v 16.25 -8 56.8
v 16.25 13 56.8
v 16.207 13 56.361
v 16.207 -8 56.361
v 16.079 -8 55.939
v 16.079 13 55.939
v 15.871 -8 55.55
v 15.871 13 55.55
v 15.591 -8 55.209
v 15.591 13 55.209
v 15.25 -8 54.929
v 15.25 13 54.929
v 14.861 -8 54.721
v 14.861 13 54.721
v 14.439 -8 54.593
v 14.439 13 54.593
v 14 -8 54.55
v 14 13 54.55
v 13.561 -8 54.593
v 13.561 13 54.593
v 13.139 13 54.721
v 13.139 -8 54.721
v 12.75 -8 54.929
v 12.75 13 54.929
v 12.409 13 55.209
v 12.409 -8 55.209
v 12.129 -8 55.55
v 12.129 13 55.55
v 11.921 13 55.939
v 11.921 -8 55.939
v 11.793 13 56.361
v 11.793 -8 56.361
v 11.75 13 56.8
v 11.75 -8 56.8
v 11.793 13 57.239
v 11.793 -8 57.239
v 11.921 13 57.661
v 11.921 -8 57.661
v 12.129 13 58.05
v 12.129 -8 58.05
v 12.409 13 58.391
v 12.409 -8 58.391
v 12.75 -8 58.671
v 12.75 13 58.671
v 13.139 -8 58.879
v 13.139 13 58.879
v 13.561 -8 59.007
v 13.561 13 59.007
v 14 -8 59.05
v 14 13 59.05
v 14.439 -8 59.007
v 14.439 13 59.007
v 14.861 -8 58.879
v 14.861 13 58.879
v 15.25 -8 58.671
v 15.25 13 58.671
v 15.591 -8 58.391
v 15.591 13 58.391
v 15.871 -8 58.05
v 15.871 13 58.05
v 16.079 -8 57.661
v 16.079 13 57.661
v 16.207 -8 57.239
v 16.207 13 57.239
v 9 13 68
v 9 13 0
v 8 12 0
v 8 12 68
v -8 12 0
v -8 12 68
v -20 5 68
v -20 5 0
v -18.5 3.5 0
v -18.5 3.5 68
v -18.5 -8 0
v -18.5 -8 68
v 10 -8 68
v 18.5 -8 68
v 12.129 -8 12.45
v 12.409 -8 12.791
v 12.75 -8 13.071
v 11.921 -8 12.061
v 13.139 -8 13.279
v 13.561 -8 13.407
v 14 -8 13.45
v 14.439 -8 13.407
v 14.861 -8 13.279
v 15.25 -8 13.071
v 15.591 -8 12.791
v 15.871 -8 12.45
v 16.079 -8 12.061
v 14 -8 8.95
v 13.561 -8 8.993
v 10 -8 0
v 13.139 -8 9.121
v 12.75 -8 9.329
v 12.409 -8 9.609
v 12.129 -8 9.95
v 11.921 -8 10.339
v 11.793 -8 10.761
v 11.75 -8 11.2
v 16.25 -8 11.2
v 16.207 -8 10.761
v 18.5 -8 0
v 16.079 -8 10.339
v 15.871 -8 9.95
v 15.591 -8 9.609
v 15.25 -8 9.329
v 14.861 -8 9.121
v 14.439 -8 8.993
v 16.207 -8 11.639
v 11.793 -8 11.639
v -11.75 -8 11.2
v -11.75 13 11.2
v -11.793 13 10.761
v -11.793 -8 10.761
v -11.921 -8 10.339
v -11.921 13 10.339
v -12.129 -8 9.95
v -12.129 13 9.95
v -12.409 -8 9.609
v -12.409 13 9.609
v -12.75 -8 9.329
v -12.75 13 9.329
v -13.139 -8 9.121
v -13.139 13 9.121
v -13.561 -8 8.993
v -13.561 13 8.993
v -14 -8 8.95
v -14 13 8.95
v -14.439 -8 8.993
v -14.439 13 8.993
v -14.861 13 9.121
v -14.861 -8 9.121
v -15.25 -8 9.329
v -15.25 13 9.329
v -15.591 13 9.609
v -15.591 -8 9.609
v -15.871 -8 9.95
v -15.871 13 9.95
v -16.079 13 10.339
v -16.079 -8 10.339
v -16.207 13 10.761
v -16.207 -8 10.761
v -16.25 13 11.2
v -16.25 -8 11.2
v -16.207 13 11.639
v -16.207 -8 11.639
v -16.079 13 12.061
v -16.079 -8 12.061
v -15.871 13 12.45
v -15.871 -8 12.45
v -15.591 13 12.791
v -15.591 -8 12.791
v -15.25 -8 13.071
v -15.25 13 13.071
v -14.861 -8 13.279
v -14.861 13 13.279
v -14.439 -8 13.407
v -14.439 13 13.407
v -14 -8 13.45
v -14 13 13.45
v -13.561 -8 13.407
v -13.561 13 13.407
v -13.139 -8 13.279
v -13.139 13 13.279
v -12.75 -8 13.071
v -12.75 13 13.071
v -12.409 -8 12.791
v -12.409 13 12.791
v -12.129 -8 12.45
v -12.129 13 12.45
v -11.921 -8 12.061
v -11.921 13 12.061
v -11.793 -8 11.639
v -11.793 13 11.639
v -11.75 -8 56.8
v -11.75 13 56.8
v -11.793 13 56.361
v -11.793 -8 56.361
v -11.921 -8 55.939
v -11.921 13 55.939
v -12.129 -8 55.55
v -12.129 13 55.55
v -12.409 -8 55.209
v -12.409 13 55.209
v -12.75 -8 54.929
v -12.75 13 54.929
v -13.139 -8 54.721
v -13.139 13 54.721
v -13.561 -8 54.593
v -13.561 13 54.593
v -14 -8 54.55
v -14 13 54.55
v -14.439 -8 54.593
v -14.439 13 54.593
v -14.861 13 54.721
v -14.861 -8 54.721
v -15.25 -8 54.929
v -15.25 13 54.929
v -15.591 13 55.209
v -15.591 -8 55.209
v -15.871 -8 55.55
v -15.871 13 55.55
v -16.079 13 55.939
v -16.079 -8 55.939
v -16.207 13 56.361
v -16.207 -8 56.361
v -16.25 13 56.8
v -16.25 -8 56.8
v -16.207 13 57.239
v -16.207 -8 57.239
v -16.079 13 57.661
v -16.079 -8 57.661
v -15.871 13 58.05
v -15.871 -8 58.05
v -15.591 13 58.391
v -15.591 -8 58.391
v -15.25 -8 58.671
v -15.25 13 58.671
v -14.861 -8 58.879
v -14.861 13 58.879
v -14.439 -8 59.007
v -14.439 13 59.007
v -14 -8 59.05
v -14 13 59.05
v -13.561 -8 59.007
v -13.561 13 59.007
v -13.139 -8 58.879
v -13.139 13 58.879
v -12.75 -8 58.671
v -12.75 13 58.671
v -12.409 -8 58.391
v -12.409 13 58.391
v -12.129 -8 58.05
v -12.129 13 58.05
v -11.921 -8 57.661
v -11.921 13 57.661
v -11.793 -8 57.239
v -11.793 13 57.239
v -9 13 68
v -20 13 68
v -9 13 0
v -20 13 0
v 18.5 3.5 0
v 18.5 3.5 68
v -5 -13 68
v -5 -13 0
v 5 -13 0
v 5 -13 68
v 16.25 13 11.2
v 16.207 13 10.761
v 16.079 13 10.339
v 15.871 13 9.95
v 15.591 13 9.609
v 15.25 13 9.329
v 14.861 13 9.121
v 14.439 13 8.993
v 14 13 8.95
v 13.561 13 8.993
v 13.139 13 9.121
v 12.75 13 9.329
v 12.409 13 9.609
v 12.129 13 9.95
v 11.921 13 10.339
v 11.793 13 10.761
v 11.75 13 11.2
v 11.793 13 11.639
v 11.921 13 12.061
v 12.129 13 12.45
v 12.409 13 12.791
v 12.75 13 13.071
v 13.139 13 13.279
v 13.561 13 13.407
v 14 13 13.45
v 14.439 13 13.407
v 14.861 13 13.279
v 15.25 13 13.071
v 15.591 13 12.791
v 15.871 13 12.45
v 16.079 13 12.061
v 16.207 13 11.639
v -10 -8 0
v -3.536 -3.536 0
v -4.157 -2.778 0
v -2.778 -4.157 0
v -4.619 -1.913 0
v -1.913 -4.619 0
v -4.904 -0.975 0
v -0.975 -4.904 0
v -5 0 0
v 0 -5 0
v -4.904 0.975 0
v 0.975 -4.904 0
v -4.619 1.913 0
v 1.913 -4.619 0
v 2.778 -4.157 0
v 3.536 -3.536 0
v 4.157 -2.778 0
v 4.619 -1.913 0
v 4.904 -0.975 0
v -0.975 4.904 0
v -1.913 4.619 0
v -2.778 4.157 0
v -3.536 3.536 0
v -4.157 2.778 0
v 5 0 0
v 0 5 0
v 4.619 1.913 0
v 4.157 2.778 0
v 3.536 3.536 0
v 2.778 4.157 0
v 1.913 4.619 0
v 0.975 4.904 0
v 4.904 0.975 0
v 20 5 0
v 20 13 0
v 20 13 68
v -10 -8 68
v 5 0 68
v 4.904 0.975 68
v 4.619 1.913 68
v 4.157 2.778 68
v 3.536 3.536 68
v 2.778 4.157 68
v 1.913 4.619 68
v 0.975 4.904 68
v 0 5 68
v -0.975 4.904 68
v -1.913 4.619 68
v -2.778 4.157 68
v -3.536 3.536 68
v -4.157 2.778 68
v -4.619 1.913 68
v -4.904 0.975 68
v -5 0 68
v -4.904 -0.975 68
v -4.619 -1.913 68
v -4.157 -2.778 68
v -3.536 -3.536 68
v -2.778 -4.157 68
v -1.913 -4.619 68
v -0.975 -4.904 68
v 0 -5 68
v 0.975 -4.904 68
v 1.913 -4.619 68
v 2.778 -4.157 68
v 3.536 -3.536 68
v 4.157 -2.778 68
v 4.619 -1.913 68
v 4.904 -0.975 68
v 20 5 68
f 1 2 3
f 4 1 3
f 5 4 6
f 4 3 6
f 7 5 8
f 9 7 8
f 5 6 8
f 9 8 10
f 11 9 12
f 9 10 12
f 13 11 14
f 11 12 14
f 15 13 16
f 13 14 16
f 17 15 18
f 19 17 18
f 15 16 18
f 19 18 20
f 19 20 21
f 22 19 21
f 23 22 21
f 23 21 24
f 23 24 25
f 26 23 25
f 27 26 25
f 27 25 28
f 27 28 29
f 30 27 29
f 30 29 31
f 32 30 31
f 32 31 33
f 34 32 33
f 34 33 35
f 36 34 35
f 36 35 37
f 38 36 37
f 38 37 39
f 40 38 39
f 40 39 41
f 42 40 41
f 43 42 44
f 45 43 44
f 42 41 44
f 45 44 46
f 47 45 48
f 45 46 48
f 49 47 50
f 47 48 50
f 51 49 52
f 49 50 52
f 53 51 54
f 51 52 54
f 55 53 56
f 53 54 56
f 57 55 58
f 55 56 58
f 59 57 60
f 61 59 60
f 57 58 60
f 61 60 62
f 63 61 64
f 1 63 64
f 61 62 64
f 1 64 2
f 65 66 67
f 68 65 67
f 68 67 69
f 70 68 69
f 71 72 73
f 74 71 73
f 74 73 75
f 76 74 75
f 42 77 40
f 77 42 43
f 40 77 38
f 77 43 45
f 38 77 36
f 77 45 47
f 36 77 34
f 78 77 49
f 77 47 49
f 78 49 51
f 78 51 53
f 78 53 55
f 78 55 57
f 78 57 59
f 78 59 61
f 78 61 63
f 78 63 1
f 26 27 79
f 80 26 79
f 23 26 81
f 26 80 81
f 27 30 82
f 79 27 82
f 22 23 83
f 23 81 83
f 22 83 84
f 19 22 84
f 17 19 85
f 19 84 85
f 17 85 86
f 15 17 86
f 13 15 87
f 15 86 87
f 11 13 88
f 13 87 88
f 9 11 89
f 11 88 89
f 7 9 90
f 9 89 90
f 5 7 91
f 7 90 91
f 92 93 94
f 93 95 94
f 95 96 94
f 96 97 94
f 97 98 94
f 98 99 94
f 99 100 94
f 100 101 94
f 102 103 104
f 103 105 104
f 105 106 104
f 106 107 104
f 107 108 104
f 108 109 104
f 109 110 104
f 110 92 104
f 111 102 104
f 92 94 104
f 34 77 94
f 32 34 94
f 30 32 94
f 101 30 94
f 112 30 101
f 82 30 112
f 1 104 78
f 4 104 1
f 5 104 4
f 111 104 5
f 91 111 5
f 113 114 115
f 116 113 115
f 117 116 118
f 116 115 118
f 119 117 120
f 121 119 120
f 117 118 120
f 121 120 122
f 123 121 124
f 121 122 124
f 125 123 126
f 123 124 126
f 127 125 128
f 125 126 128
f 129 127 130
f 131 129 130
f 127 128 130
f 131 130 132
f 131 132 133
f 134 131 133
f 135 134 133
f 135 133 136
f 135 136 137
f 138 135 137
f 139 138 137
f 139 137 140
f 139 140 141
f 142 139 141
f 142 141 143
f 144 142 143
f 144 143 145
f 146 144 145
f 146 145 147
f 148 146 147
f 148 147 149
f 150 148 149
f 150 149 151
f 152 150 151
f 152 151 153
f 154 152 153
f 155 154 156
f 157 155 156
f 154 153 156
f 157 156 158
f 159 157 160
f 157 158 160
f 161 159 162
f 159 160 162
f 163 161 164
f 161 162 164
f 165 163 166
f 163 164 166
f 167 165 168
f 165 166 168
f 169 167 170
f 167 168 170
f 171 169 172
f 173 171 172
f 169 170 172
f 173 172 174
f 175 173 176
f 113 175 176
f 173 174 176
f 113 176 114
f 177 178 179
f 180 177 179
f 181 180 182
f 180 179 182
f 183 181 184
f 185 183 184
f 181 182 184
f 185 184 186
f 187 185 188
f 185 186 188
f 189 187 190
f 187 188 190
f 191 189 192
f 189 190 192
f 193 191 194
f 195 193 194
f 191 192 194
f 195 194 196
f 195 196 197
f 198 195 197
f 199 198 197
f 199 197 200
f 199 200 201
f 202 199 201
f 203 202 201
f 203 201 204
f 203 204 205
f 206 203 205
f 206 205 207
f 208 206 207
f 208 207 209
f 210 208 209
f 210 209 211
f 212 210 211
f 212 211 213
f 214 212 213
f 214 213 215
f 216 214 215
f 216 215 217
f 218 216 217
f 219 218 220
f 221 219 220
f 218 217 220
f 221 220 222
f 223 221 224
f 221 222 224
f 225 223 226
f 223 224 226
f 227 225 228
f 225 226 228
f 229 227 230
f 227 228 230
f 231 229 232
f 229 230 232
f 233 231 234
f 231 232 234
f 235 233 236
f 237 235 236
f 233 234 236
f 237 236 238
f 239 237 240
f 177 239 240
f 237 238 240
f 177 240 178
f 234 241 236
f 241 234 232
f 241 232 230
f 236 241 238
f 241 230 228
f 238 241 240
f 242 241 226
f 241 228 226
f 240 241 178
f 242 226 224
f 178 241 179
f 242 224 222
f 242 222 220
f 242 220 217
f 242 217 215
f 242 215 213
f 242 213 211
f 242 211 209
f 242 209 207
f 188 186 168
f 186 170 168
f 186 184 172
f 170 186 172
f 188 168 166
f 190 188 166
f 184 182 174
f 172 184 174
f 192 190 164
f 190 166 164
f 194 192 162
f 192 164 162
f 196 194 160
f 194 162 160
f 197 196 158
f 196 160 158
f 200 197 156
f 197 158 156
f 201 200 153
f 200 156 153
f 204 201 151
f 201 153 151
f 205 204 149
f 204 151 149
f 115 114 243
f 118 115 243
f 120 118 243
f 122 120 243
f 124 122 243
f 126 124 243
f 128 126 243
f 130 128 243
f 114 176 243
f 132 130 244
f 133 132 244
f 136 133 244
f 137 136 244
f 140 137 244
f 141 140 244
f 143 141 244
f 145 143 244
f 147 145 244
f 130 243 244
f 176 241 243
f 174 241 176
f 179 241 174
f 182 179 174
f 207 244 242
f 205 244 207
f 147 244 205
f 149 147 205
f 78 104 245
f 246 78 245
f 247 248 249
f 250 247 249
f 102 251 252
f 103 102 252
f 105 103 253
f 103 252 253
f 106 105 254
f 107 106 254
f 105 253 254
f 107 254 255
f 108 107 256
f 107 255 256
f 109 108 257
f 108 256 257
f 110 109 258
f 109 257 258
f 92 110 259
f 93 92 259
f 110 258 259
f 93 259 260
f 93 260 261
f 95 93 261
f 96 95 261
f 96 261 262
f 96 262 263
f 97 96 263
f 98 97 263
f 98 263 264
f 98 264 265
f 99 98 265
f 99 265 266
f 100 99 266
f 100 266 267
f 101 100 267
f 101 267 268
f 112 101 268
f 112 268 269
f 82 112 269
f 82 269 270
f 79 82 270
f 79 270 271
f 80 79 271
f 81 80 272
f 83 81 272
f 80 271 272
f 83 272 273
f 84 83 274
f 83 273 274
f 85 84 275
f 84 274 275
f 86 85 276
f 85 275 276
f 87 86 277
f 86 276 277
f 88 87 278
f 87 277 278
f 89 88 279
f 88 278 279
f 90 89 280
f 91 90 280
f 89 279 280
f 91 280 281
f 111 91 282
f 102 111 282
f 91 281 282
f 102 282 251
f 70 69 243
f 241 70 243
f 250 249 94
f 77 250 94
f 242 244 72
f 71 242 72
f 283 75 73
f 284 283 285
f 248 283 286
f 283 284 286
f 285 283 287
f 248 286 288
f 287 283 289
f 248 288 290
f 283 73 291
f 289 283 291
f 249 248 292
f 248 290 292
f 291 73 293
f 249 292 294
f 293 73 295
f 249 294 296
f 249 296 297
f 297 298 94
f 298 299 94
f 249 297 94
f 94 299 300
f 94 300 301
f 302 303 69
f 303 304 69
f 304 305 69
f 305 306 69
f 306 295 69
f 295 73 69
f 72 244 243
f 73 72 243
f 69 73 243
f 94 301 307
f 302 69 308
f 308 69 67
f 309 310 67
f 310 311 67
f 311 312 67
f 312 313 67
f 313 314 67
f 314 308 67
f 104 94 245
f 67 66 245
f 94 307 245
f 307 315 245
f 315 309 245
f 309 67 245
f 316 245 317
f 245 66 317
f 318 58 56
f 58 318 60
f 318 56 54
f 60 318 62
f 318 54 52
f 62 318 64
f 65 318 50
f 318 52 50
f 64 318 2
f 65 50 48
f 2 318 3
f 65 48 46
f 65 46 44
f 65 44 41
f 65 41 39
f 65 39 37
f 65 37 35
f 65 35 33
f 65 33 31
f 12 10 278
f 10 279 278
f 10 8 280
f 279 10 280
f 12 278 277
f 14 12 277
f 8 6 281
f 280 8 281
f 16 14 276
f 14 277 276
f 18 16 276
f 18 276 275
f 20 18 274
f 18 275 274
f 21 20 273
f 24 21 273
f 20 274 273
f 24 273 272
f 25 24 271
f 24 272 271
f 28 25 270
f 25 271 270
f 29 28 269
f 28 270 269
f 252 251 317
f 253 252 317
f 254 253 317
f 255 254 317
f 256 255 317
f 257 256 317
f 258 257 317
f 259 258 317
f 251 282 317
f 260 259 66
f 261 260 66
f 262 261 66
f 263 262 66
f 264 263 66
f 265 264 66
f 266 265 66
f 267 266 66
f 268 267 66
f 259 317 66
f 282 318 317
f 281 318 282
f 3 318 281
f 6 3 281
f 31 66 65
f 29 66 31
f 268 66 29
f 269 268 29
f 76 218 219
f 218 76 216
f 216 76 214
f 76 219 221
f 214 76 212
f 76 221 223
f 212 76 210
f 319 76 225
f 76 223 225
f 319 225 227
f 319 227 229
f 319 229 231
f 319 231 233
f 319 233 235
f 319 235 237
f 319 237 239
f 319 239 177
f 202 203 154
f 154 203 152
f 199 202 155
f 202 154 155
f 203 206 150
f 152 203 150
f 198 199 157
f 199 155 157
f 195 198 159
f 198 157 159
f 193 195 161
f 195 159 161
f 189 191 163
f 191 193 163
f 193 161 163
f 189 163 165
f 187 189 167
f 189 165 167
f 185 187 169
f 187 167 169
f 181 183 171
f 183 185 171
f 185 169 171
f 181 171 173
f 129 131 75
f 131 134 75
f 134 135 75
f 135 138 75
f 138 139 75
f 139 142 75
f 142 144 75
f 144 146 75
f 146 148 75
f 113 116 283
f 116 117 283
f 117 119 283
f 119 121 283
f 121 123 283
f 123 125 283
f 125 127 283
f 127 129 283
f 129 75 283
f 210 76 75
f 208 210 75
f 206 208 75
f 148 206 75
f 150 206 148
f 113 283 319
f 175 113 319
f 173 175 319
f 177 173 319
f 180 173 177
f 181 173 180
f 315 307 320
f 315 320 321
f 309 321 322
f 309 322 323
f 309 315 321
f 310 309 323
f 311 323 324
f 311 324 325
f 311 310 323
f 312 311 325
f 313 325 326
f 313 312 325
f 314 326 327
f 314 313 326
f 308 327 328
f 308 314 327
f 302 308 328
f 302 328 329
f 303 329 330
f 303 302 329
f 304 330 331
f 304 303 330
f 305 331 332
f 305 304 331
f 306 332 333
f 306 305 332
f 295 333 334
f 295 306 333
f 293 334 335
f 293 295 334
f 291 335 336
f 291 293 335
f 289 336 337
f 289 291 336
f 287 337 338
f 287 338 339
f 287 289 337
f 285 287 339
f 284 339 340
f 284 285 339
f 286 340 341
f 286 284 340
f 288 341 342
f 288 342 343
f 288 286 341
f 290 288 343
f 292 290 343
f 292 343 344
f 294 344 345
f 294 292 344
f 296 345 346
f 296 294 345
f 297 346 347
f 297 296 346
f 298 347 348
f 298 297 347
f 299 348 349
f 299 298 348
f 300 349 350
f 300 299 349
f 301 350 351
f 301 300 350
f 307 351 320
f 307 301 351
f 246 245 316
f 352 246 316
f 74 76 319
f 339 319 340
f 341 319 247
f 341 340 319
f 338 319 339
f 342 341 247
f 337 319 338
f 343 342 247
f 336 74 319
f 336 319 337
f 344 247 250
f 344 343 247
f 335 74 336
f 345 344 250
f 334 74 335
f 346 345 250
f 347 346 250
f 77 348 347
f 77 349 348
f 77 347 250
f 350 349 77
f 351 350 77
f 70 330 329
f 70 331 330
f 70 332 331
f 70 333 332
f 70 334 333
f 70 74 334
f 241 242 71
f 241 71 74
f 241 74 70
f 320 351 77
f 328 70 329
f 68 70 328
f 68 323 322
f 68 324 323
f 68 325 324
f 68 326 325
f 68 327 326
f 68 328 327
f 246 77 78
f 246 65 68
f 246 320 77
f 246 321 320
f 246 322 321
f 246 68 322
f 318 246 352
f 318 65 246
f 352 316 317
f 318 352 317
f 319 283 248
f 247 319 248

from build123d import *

# Parameters (mm, degrees)
SKETCH1_R      = 5
EXTRUDE1_DEPTH = 68
SKETCH2_R      = 2.25
EXTRUDE2_DEPTH = 68


with BuildPart() as part:
    # Sketch1 → Extrude1 (new body)
    with BuildSketch(Plane.XY):
        Polygon((-18.5, -8), (-10, -8), (-5, -13), (5, -13), (10, -8), (18.5, -8), (18.5, 3.5), (20, 5), (20, 13), (9, 13), (8, 12), (-8, 12), (-9, 13), (-20, 13), (-20, 5), (-18.5, 3.5), align=None)
        Circle(SKETCH1_R, mode=Mode.SUBTRACT)
    extrude(amount=EXTRUDE1_DEPTH)

    # Sketch2 → Extrude2 (cut)
    with BuildSketch(Plane(origin=(0, 13, 0), x_dir=(1, 0, 0), z_dir=(0, 1, 0))):
        with Locations((-14, -11.2)):
            Circle(SKETCH2_R)
        with Locations((14, -11.2)):
            Circle(SKETCH2_R)
        with Locations((14, -56.8)):
            Circle(SKETCH2_R)
        with Locations((-14, -56.8)):
            Circle(SKETCH2_R)
    extrude(amount=-EXTRUDE2_DEPTH, mode=Mode.SUBTRACT)


solid = part.part
